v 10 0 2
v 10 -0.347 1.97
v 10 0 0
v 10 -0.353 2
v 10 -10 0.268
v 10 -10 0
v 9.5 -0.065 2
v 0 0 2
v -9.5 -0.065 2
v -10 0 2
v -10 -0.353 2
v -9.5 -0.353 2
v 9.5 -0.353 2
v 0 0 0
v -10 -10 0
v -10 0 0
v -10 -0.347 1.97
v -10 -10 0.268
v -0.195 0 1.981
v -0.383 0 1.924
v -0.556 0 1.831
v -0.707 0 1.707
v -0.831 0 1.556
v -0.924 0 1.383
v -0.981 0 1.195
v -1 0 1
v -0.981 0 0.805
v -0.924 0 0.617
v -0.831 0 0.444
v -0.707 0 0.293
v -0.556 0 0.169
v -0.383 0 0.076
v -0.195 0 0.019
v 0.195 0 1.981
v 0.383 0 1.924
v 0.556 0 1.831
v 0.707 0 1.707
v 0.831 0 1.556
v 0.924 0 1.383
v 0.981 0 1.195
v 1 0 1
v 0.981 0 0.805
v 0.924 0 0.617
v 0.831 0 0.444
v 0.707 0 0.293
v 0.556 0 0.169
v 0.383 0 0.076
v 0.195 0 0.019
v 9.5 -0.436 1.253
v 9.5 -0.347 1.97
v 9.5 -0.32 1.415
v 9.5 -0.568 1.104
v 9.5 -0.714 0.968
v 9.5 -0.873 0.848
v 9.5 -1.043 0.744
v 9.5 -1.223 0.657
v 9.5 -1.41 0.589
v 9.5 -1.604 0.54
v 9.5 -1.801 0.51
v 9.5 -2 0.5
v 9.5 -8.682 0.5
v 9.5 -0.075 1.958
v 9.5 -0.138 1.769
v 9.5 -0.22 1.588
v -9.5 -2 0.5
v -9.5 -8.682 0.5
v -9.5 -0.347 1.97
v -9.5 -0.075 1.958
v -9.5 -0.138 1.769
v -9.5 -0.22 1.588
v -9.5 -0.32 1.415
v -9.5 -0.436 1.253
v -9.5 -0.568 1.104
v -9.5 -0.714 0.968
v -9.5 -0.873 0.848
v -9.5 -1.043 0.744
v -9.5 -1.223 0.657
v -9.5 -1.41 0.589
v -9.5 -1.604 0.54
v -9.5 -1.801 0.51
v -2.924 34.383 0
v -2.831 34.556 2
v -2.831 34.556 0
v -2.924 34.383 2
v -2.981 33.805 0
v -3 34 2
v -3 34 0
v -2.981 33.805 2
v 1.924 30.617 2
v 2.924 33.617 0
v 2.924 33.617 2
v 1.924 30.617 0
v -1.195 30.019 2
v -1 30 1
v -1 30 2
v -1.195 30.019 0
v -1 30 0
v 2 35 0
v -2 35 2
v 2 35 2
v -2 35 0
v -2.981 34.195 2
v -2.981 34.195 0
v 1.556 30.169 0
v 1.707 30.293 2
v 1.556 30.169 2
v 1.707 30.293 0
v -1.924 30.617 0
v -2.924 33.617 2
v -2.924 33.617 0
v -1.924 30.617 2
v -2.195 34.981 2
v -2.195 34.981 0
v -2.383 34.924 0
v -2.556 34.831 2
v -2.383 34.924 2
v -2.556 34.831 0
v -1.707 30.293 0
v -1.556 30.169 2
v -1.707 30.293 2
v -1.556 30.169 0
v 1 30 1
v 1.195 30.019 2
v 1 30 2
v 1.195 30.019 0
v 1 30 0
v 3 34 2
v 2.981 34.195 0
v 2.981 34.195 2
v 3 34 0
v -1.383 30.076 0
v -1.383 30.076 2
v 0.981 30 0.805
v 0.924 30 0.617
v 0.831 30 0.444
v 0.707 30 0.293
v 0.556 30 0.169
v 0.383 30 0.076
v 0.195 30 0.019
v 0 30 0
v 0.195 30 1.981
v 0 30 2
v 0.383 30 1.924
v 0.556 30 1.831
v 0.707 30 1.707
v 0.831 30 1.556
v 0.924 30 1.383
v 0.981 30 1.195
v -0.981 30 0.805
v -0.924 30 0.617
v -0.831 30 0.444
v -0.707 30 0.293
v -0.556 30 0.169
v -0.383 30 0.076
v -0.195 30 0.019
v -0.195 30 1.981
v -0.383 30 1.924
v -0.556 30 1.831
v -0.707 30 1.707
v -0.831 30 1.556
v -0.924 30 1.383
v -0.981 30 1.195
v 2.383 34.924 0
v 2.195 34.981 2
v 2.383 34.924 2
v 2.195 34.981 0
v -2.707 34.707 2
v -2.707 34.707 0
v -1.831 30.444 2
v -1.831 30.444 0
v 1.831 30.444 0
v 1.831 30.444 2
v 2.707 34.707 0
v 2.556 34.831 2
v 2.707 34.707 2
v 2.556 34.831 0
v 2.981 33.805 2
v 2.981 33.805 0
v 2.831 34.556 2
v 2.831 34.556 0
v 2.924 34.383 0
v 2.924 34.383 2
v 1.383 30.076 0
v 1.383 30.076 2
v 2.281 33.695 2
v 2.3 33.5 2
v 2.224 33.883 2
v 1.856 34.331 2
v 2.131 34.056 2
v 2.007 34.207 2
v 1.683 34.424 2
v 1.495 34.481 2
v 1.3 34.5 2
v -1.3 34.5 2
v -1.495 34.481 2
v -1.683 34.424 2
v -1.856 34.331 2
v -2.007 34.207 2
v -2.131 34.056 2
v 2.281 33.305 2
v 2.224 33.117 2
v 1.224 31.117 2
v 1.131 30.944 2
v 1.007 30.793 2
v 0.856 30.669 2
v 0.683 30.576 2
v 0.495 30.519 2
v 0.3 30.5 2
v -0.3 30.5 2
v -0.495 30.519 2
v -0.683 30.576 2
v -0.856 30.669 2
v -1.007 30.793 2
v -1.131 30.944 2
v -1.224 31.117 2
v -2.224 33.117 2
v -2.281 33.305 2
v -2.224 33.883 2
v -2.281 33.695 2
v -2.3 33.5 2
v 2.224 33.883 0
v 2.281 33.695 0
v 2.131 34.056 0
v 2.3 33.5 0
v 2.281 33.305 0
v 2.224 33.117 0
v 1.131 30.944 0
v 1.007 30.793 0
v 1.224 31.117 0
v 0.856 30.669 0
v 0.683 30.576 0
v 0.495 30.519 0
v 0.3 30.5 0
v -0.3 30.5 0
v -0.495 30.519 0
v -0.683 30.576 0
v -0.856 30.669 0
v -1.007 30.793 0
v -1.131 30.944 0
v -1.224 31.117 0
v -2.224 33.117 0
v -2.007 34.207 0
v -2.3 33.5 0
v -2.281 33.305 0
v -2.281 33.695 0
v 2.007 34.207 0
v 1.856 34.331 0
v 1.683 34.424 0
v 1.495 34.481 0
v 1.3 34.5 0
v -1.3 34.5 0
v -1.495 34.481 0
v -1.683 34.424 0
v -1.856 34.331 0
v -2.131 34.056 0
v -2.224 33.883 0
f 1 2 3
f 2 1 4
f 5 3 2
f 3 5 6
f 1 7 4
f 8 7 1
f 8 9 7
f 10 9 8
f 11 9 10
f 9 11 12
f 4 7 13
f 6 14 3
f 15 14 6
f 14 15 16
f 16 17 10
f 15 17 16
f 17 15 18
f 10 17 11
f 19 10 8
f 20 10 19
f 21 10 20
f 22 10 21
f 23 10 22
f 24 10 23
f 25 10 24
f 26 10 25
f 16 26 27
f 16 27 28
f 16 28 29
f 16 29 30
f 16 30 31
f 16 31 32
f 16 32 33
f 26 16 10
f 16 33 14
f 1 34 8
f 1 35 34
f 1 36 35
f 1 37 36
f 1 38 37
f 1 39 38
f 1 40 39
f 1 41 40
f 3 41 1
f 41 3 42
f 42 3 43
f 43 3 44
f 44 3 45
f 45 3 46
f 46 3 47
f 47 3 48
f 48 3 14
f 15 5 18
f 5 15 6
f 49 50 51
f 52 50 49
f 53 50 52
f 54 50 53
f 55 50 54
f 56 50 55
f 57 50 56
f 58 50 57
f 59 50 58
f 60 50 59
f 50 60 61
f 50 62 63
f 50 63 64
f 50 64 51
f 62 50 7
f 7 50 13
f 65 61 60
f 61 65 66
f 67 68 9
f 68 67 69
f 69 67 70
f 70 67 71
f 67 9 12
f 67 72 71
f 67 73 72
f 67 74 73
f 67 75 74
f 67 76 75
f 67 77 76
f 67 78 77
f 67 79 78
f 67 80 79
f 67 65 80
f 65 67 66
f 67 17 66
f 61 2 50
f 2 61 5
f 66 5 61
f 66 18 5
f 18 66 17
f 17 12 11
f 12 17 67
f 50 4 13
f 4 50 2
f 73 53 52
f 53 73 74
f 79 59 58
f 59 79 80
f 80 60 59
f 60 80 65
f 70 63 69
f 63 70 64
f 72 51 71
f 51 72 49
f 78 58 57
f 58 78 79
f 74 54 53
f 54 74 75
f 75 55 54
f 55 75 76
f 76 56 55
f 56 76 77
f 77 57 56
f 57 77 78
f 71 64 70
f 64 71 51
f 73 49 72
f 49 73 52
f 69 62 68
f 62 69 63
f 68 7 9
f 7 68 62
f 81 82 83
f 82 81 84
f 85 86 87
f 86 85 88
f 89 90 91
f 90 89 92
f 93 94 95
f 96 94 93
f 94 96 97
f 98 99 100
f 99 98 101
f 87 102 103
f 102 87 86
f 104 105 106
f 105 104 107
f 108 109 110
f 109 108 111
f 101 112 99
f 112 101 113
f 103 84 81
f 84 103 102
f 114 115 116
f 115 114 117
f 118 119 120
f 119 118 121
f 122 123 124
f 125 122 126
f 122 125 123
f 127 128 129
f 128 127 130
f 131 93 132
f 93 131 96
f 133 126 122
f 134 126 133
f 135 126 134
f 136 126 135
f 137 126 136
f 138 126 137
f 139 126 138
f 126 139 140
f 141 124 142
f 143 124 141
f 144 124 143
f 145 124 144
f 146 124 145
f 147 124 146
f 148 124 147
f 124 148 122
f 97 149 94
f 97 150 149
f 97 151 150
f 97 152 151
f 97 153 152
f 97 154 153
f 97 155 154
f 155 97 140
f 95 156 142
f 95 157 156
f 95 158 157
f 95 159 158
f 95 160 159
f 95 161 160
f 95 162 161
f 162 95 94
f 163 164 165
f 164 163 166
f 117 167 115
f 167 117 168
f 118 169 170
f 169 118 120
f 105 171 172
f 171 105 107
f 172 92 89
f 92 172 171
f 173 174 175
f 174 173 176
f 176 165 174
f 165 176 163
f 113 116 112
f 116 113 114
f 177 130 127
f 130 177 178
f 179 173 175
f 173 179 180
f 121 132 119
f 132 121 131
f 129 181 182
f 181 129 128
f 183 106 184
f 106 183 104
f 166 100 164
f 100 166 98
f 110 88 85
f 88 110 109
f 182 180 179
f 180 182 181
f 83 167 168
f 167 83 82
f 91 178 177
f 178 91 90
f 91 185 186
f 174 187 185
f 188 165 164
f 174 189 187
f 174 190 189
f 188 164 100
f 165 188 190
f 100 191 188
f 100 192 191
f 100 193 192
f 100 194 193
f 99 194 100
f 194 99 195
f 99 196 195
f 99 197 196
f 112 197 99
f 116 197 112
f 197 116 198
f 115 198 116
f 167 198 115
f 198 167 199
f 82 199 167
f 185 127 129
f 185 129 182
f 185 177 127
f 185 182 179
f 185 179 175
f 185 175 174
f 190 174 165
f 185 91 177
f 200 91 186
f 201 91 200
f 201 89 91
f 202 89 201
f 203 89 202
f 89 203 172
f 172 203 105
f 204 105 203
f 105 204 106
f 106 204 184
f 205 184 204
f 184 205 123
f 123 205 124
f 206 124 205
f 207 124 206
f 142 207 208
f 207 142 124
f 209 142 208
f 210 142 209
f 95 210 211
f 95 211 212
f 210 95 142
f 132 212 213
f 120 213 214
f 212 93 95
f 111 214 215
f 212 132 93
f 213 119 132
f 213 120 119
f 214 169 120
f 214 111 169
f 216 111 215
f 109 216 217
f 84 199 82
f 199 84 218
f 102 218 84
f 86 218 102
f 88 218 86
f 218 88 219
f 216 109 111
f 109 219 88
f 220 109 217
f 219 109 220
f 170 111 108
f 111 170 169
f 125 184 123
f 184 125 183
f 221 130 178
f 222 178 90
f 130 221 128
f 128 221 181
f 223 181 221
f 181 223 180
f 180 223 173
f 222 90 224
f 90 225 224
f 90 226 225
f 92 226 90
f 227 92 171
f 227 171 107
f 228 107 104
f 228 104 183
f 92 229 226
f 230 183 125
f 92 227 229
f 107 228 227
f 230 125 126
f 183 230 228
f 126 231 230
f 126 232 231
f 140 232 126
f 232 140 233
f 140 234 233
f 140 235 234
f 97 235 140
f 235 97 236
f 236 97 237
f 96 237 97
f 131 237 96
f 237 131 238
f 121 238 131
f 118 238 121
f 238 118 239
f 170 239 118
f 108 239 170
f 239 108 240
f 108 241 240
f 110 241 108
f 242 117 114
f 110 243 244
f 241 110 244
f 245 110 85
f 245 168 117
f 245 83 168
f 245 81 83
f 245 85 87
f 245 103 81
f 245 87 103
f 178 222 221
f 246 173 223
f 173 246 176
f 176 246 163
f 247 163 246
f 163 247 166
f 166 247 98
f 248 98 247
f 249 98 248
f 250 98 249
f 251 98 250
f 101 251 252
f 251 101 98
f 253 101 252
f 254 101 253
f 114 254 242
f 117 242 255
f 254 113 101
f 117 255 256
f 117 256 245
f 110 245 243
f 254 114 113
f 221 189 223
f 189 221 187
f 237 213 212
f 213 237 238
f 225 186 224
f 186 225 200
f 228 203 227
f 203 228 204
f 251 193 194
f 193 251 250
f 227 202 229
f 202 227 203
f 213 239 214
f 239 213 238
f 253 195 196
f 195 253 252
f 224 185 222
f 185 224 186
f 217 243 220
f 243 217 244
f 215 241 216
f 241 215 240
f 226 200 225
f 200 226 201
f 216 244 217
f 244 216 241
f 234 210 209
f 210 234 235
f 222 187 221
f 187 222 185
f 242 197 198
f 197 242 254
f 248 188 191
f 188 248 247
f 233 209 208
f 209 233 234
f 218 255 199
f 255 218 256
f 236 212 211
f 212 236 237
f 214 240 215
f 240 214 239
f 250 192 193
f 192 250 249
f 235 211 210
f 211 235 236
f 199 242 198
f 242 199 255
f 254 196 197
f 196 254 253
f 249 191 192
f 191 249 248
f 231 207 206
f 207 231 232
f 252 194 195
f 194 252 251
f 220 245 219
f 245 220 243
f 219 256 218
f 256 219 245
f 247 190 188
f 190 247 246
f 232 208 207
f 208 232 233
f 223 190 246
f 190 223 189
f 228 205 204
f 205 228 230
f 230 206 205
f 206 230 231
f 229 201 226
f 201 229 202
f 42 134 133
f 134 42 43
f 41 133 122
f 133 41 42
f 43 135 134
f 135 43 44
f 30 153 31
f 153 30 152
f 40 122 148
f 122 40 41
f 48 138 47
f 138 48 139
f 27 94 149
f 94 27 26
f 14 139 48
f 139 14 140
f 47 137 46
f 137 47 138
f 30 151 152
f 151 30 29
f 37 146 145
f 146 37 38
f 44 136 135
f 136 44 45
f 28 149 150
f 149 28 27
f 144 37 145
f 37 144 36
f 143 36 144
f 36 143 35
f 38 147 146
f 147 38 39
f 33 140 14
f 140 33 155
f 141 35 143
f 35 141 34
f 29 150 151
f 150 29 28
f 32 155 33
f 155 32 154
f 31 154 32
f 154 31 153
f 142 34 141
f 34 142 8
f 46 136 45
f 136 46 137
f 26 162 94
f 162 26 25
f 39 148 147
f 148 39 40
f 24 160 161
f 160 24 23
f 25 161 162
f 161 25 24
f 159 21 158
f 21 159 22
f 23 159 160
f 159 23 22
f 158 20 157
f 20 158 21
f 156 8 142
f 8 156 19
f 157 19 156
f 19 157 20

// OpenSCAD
// snow shovel

$fa=2; $fs=0.2; // smooth the handle

// shovel blade
color("silver")
difference(){
    translate([-10,-10,0])
        cube([20,10,2]);
    translate([-9.5,-12,.5])
        cube([19,10,2]);
    // slant
    rotate([10,0,0])
        translate([-11,-10,2])
            cube([22,10,2]);
    // scoop
    translate([-9.5,-2,2.5])
        rotate([0,90,0])
            cylinder(19,2,2);
}

// handle shaft
color("brown")
rotate([270,0,0])
translate([0,-1,0])
cylinder(30,1,1);

// handle grip
color("green")
difference(){
    hull(){
        translate([-1,31,0])
            cylinder(2,1,1);
        translate([1,31,0])
            cylinder(2,1,1);
        translate([-2,34,0])
            cylinder(2,1,1);
        translate([2,34,0])
            cylinder(2,1,1);
    }
    hull(){
        translate([-.3,31.5,-.05])
            cylinder(2.1,1,1);
        translate([.3,31.5,0])
            cylinder(2.1,1,1);
        translate([-1.3,33.5,0])
            cylinder(2.1,1,1);
        translate([1.3,33.5,0])
            cylinder(2.1,1,1);
    }
}

// Written in 2020 by Algot Runeman
//
// To the extent possible under law, the author(s) have dedicated all
// copyright and related and neighboring rights to this software to the
// public domain worldwide. This software is distributed without any
// warranty.
//
// You should have received a copy of the CC0 Public Domain
// Dedication along with this software.
// If not, see <http://creativecommons.org/publicdomain/zero/1.0/>.
